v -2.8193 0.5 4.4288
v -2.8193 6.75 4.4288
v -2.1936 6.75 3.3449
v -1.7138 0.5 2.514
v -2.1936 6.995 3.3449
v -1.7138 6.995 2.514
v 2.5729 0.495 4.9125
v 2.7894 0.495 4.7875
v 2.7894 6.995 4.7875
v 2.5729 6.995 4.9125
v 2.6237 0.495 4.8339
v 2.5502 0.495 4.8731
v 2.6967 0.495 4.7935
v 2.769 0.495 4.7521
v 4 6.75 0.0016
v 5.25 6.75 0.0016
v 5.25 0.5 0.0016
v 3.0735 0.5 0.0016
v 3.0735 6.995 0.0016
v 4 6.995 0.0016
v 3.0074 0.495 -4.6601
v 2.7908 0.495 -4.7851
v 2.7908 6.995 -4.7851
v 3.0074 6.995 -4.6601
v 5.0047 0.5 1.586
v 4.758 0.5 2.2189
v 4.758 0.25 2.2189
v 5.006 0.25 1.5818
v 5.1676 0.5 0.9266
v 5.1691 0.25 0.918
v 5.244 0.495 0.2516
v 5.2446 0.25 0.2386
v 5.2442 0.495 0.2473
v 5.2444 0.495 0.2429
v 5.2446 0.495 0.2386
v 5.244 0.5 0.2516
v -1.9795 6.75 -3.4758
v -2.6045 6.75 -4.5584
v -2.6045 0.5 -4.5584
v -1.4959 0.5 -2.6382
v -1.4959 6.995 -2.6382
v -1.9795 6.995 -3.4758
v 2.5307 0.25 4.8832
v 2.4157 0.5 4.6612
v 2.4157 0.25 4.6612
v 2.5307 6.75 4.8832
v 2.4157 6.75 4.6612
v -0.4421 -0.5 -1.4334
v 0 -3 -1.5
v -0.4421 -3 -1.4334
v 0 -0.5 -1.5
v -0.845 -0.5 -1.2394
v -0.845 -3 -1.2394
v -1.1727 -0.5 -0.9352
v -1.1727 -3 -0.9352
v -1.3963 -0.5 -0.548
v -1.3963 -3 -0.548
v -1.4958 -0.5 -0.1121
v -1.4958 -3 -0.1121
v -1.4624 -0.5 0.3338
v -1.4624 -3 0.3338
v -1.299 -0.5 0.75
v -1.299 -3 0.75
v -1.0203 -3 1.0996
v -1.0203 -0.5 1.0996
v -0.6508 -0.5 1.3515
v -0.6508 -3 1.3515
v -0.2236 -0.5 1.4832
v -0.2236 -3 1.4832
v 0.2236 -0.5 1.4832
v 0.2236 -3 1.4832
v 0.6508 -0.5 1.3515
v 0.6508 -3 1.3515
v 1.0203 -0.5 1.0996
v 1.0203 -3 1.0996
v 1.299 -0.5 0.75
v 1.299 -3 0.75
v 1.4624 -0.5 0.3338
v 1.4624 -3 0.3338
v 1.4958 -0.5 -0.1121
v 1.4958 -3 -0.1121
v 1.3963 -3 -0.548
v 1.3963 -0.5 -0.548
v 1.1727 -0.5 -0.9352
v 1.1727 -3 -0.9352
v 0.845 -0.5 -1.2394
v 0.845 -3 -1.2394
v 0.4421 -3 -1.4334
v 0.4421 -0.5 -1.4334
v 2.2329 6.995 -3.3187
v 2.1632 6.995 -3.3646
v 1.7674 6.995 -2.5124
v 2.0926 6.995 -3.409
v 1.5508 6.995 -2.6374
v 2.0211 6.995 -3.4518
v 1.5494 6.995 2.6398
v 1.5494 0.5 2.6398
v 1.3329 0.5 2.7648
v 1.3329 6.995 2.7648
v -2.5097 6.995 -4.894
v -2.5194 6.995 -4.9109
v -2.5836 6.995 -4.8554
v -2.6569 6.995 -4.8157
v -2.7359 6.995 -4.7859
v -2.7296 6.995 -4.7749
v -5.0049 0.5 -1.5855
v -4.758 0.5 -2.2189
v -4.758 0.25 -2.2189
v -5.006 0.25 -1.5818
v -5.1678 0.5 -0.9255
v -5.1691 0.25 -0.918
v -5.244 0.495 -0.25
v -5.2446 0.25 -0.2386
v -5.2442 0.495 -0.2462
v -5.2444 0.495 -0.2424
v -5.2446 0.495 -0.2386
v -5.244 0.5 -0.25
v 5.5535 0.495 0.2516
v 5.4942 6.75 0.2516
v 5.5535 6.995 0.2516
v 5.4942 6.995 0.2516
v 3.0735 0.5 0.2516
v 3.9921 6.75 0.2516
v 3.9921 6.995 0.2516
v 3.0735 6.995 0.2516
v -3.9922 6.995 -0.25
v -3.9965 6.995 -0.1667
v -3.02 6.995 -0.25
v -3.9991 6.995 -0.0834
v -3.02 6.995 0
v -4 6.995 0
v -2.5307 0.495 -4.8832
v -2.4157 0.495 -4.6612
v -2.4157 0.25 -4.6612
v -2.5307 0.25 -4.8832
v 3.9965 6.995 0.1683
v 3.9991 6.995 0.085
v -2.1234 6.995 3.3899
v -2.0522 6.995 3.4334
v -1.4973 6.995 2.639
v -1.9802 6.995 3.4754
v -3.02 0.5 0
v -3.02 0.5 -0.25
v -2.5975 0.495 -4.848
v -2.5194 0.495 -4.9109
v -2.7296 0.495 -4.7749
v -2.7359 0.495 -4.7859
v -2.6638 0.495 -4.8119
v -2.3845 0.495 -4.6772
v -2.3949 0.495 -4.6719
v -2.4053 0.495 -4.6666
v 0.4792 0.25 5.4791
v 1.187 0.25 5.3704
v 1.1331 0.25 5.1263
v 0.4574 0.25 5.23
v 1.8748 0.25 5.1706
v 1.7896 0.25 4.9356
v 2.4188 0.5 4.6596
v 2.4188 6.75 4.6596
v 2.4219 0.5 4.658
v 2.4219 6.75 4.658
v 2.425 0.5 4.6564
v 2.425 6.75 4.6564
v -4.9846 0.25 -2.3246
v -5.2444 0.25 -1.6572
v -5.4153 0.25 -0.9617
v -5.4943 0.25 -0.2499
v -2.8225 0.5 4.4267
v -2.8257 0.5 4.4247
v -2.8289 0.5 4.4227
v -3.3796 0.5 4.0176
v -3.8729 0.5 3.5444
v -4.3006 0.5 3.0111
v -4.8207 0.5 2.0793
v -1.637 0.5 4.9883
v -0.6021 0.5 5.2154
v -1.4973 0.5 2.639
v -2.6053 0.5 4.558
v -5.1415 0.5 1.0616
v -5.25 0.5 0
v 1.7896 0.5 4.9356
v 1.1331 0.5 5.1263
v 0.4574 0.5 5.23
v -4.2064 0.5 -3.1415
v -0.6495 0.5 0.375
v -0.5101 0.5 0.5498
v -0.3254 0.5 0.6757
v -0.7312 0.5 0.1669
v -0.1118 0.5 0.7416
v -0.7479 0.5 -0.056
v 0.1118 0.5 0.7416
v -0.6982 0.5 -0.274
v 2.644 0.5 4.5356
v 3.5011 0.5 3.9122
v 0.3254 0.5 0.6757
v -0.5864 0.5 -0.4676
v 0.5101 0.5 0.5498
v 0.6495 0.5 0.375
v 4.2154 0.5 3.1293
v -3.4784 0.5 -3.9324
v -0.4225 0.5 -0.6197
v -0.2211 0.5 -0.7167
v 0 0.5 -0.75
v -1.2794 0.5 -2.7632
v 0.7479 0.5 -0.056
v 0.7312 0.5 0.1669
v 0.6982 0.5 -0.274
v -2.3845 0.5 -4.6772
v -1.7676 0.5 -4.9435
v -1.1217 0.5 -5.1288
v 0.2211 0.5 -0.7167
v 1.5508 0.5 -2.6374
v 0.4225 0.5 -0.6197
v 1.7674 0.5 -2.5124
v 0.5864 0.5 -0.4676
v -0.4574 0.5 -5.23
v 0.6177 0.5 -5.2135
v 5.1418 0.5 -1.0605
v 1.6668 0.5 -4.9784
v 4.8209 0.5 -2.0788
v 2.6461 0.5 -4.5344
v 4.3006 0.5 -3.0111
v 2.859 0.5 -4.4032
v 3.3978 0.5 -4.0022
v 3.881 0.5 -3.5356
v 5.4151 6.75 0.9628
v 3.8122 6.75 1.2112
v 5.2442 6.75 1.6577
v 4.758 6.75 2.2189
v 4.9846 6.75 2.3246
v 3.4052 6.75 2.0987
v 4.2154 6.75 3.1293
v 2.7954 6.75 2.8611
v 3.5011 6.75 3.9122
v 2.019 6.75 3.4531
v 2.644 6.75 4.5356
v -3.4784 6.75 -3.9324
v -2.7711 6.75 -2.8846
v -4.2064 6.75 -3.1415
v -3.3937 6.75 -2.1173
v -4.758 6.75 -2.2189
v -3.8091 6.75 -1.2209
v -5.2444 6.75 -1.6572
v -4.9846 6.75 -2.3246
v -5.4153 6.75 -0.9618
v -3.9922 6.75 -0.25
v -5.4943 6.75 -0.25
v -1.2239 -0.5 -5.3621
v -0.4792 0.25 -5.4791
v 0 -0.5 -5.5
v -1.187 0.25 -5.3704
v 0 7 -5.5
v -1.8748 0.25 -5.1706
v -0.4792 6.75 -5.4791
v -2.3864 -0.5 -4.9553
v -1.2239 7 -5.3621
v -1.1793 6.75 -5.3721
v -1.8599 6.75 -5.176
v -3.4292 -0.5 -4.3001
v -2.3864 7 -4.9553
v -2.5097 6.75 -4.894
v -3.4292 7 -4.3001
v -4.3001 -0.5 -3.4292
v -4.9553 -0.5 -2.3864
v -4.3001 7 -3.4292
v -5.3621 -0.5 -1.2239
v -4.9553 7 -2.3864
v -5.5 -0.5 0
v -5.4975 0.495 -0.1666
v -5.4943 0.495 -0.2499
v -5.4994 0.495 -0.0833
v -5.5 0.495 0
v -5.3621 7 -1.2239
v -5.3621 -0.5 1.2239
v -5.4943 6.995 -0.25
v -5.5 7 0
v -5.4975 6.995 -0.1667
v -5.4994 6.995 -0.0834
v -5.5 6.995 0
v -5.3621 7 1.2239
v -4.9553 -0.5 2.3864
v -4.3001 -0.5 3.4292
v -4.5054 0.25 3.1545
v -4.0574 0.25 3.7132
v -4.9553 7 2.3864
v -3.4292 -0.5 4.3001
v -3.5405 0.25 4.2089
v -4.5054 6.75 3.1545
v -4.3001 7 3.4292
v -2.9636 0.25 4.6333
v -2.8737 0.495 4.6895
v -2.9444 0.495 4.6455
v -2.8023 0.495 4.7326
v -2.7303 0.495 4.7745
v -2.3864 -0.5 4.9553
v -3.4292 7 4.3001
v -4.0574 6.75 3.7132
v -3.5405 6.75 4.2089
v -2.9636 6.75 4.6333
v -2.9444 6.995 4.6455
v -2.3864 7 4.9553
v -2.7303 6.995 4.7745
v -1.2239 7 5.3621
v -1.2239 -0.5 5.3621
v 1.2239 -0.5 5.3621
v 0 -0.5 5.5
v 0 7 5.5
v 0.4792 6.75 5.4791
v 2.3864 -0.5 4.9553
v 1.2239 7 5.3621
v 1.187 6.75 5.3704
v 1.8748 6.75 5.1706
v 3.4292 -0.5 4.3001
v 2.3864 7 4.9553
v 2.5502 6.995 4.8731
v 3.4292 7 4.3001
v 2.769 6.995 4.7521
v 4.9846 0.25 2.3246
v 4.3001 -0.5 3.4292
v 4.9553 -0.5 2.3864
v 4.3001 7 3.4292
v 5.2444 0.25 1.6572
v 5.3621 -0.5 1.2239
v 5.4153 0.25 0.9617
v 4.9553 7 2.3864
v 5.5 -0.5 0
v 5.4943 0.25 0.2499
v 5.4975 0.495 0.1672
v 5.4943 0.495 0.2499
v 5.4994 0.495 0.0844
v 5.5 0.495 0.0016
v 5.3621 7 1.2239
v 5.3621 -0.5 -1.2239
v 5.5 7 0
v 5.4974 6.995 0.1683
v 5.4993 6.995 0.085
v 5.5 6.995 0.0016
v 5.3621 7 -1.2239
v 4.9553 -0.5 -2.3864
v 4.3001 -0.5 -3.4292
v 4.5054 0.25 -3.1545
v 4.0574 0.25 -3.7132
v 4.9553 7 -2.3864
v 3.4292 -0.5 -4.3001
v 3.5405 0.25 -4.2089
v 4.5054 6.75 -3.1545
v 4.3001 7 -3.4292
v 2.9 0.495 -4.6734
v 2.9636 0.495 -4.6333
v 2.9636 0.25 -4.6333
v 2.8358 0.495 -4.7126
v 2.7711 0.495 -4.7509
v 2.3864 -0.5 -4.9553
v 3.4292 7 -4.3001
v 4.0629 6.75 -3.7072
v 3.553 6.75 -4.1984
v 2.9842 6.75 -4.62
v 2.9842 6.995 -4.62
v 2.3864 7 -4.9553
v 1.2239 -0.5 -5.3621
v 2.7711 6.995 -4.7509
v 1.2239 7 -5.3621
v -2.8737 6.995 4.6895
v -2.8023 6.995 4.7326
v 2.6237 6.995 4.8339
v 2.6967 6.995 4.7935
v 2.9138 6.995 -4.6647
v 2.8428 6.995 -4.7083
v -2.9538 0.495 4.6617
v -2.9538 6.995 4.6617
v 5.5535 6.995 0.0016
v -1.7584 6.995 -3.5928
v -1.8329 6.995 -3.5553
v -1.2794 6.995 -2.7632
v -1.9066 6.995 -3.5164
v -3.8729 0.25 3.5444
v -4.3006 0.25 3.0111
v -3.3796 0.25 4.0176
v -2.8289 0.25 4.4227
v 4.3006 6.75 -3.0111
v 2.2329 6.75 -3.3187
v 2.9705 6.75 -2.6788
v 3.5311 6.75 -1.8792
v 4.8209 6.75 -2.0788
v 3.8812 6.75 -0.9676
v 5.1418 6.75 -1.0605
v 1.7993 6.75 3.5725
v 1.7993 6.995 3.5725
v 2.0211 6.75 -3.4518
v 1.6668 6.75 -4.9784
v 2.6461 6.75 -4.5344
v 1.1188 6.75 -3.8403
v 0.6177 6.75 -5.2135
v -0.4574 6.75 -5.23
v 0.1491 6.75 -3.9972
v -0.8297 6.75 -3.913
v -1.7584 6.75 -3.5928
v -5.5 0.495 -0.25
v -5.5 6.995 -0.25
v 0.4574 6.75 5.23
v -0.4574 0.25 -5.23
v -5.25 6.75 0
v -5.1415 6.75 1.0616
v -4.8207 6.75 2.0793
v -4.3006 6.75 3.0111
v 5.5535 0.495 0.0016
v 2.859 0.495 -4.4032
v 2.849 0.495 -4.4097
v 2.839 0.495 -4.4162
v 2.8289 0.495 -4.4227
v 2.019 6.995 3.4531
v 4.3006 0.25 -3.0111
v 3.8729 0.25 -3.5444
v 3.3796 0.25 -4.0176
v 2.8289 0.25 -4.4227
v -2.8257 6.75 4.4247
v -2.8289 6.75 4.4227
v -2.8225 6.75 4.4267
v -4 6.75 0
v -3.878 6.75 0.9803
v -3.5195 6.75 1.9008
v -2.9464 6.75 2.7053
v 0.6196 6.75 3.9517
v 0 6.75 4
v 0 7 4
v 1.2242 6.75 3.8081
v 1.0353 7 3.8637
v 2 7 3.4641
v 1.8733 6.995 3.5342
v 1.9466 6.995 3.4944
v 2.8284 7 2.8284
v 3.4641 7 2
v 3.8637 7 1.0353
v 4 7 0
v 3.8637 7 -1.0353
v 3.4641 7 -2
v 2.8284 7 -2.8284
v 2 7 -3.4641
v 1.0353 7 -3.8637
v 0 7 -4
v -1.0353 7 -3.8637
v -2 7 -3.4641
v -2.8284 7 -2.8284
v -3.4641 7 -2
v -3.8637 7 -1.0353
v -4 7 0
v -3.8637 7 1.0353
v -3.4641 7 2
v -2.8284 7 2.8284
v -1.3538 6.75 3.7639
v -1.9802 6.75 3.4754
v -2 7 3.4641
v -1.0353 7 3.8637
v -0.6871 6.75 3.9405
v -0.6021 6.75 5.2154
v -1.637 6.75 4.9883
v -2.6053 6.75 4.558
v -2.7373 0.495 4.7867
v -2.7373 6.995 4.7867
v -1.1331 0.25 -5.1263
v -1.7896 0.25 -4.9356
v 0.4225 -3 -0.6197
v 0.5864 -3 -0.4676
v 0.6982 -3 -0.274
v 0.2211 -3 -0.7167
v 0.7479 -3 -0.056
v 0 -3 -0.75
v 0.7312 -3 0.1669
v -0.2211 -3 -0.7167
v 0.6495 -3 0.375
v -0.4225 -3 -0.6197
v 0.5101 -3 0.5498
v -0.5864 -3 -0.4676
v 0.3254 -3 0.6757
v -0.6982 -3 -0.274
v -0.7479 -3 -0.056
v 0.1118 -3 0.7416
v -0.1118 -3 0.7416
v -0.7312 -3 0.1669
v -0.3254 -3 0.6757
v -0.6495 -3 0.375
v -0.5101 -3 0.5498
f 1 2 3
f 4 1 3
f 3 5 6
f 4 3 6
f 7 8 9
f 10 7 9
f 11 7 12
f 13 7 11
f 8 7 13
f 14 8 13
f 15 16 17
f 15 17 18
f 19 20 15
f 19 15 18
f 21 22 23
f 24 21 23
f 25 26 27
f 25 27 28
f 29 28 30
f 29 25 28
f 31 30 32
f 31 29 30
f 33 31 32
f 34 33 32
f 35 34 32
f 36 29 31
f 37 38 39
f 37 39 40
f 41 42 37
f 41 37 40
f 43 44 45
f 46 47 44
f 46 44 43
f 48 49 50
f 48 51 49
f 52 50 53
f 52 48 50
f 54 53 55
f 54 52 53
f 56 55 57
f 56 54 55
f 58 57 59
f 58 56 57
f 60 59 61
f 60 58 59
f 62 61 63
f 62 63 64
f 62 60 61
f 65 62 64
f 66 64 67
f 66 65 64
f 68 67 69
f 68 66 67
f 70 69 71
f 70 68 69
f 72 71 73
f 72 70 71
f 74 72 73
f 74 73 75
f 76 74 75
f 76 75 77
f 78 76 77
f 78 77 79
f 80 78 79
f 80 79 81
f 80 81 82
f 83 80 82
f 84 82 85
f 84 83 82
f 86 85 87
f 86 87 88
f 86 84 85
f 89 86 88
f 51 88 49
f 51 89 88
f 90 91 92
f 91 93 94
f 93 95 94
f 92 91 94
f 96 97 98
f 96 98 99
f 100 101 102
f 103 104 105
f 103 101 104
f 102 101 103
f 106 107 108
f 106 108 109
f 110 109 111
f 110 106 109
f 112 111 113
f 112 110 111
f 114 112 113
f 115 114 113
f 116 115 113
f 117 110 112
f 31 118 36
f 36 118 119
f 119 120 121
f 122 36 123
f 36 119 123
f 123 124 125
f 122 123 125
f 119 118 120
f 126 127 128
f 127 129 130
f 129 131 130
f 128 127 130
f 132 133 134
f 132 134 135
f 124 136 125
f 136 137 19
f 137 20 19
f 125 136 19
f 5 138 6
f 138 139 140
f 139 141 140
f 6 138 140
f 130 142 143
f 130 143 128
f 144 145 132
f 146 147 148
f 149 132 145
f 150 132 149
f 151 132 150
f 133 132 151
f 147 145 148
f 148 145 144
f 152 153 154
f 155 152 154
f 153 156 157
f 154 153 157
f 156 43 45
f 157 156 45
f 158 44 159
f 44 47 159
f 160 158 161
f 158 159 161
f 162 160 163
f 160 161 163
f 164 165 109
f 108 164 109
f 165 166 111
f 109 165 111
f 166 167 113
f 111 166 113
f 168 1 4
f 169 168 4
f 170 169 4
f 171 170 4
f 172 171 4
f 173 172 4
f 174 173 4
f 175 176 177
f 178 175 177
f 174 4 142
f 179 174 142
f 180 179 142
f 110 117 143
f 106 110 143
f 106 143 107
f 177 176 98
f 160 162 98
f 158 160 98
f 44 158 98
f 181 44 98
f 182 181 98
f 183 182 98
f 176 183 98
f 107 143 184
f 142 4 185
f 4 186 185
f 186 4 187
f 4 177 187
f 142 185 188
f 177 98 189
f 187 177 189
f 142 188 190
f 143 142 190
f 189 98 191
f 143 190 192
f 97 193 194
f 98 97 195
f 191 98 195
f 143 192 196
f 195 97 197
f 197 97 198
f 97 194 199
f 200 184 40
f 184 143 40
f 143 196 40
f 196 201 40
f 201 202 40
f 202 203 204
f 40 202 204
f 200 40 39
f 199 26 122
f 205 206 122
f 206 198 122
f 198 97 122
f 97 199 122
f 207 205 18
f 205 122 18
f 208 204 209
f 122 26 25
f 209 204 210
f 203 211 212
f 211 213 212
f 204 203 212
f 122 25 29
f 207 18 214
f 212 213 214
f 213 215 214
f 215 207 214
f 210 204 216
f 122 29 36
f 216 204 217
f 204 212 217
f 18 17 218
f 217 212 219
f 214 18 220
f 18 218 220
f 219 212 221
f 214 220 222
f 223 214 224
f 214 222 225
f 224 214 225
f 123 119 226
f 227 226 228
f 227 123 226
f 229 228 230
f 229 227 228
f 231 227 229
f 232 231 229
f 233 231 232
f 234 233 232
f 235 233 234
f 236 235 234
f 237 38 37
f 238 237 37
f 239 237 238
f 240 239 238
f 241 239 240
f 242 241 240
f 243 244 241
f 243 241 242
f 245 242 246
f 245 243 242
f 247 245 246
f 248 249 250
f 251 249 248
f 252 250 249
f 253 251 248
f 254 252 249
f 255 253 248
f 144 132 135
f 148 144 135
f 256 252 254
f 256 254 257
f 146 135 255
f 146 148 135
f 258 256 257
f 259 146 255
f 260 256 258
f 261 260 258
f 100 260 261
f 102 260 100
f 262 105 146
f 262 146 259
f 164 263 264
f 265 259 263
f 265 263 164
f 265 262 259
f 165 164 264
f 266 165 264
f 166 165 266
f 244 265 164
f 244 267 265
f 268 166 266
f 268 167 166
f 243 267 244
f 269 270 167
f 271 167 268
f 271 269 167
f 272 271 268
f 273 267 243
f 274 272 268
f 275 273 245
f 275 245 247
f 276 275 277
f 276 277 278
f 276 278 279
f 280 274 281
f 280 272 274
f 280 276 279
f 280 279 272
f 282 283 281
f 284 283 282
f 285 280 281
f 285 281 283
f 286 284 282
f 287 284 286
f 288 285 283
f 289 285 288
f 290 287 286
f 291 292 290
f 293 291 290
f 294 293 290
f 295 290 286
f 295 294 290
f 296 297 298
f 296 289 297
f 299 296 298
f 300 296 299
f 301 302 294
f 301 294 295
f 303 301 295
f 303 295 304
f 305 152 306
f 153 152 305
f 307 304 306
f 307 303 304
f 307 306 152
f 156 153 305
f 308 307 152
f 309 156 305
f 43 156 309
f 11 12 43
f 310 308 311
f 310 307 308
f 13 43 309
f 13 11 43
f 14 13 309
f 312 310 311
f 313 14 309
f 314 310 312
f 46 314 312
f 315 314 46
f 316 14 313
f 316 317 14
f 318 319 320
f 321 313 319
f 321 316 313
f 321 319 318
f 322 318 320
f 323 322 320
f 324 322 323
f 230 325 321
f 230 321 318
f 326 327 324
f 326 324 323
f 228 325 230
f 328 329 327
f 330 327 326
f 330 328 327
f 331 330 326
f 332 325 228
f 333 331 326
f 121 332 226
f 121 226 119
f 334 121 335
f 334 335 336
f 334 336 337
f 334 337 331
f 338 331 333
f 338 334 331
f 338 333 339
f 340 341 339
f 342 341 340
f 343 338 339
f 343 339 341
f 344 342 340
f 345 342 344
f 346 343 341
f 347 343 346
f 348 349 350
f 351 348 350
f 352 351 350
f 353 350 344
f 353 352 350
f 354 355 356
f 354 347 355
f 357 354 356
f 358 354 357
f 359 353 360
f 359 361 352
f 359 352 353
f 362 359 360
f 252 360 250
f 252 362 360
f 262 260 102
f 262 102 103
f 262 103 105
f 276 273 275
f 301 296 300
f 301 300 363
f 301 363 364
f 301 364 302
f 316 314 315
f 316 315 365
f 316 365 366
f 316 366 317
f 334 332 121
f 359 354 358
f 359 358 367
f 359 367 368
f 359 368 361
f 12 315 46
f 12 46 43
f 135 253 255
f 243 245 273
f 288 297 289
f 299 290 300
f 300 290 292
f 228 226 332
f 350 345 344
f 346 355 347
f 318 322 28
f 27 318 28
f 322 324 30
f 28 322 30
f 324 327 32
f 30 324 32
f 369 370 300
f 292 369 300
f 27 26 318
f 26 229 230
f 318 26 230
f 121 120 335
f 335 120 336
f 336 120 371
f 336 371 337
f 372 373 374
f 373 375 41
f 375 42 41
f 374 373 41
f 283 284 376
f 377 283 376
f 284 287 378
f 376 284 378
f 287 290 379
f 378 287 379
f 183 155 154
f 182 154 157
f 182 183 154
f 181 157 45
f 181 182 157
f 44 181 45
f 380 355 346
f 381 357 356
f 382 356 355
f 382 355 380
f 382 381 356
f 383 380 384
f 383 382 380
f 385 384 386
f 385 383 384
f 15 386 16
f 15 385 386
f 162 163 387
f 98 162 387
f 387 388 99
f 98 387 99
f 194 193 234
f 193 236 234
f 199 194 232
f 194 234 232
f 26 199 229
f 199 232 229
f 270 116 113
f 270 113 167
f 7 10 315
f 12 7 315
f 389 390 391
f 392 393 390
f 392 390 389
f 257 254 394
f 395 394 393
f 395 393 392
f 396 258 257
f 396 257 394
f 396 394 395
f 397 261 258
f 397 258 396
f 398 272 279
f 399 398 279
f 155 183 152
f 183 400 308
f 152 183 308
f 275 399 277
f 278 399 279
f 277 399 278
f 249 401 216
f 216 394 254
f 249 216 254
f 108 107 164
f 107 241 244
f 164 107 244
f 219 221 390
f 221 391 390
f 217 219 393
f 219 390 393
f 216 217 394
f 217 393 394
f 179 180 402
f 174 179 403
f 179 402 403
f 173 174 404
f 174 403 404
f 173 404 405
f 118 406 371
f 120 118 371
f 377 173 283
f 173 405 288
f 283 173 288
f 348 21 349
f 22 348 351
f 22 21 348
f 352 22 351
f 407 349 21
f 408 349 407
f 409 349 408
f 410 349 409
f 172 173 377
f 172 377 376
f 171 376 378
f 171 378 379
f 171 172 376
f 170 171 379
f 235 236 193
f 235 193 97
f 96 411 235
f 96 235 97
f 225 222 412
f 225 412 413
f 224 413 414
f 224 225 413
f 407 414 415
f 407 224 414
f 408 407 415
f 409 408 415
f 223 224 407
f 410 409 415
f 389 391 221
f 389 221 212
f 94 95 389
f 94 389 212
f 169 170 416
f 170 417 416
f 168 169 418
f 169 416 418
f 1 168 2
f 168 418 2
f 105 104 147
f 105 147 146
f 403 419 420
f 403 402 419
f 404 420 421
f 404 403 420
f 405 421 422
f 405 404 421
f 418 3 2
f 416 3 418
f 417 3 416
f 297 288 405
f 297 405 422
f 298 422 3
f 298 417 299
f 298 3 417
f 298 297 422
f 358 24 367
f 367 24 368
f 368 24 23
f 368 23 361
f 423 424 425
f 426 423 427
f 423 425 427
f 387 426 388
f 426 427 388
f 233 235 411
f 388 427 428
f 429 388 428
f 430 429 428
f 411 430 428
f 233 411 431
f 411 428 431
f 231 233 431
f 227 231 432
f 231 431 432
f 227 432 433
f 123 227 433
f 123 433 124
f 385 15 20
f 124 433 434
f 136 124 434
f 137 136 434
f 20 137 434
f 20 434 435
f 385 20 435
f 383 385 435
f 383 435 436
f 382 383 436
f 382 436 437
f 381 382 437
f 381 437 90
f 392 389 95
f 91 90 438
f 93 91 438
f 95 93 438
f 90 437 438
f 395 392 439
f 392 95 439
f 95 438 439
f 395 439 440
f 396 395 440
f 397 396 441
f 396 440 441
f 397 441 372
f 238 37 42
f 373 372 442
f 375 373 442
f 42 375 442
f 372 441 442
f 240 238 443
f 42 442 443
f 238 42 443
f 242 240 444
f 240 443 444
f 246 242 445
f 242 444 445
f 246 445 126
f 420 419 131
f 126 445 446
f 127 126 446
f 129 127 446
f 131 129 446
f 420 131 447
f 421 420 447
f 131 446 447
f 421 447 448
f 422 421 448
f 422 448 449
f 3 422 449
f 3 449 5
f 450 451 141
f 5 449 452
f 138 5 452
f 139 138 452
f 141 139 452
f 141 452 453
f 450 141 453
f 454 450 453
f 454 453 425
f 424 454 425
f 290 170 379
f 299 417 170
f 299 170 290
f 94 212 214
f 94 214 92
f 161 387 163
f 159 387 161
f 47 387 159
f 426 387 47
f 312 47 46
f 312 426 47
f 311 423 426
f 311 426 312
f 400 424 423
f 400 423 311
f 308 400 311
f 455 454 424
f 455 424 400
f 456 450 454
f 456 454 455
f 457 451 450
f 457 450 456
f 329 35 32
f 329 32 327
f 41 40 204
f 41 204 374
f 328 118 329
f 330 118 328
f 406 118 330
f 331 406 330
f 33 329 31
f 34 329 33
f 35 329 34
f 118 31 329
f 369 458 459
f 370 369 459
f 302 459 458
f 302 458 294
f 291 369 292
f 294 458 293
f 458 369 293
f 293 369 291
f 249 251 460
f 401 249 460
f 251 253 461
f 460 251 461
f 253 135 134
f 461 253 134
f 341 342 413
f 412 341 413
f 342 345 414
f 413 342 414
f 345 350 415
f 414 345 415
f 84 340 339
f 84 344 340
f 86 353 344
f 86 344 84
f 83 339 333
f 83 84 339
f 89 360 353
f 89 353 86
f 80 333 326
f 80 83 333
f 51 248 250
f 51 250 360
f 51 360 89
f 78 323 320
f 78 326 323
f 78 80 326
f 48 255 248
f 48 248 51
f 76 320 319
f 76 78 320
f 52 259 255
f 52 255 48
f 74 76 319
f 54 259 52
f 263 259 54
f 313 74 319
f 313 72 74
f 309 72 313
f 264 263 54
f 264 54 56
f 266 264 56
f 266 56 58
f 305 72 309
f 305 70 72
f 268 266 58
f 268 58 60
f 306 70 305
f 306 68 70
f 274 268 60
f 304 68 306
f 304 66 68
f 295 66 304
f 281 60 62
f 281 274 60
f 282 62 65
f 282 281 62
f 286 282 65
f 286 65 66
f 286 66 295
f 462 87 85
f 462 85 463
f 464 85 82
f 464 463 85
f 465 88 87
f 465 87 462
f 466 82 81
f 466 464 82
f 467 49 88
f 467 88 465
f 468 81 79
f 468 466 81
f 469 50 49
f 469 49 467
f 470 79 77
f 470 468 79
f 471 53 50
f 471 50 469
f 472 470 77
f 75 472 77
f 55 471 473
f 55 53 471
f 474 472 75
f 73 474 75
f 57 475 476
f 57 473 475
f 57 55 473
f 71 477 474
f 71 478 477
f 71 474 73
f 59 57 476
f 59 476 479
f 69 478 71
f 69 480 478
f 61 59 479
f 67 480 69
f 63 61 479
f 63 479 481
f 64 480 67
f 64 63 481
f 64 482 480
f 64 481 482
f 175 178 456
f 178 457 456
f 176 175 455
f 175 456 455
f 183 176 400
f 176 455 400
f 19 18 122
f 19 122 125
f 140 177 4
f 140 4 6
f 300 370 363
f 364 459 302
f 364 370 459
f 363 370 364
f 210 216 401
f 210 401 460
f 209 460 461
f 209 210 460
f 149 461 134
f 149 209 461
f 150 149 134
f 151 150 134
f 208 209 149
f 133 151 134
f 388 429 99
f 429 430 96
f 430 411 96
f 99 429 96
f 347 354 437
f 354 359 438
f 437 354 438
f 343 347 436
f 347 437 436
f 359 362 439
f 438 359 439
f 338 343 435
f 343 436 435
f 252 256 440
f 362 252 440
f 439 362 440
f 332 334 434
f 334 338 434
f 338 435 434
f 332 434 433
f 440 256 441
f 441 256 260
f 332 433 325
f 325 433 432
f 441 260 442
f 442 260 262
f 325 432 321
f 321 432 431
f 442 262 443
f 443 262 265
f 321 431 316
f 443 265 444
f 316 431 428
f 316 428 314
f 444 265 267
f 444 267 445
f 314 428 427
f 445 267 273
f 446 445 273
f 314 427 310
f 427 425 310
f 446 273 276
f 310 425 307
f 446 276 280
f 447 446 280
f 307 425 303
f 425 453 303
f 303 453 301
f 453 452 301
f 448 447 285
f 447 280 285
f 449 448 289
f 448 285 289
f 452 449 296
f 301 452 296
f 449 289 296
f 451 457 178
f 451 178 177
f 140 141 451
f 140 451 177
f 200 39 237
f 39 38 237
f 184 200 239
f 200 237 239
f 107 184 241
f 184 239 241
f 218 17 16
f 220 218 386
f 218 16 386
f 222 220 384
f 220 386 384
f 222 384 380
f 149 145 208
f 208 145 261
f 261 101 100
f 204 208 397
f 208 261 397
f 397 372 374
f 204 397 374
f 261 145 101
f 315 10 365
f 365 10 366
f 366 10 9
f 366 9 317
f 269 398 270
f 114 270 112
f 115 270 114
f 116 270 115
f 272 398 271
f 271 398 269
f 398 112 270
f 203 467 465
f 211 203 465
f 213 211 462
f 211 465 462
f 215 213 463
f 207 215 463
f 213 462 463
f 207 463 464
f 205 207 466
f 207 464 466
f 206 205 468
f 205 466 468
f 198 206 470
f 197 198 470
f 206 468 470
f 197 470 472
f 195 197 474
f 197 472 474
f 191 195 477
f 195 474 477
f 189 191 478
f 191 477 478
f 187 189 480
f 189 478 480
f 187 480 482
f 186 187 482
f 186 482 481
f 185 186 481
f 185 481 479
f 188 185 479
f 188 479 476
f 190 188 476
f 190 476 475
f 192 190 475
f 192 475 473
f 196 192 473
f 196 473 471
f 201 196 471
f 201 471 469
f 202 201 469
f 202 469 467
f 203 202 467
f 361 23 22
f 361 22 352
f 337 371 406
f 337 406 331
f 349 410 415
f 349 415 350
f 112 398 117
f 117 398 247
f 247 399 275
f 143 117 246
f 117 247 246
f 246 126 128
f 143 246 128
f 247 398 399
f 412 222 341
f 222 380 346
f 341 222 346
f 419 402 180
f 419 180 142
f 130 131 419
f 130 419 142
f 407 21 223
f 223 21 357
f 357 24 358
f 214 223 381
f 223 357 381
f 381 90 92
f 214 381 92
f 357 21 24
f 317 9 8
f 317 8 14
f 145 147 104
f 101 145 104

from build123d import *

# Parameters (mm, degrees)
SKETCH1_W                 = 5.5
SKETCH1_H                 = 7
SHELL1_T                  = -0.25
SHELL1_THICKNESS_2_FACE_R = 5.25
SHELL1_THICKNESS_2_DEPTH  = 0.25
SKETCH6_R                 = 5.5
SKETCH6_R_2               = 4
BOSS_EXTRUDE1_DEPTH       = 0.25
WRAP1_SECTION_W           = 0.25
WRAP1_SECTION_H           = 6.5
WRAP1_ANGLE               = 22.397441082
CIRPATTERN1_COUNT         = 6
SKETCH10_W                = 2.48
SKETCH10_H                = 6.5
BOSS_EXTRUDE2_DEPTH       = 0.25
CIRPATTERN2_COUNT         = 6
CUT_EXTRUDE1_REACH        = 14.692
SKETCH12_R                = 0.75


with BuildPart() as part:
    # Sketch1 → Revolve1 (revolve)
    with BuildSketch(Plane.XY, mode=Mode.PRIVATE) as revolve1_sk:
        with Locations((2.75, 3.5)):
            Rectangle(SKETCH1_W, SKETCH1_H)
    revolve(revolve1_sk.sketch.rotate(Axis((0, 0, 0), (0, 1, 0)), 90), axis=Axis((0, 0, 0), (0, 1, 0)))

    # Shell1
    shell1_openings = [part.faces().sort_by_distance(p)[0] for p in [
        (0, 7, 0),
    ]]
    offset(amount=SHELL1_T, openings=shell1_openings, kind=Kind.INTERSECTION)

    # Shell1 thickness 2 face (on inner face of the shell) → Shell1 thickness 2 (add)
    with BuildSketch(Plane(origin=(0, 0.25, 0), x_dir=(0, 0, -1), z_dir=(0, -1, 0))):
        Circle(SHELL1_THICKNESS_2_FACE_R)
    extrude(amount=-SHELL1_THICKNESS_2_DEPTH)

    # Sketch6 → Boss-Extrude1 (add)
    with BuildSketch(Plane(origin=(0, 7, 0), x_dir=(1, 0, 0), z_dir=(0, 1, 0))):
        with Locations(Location((0, 0, 0), (0, 0, 90))):
            Circle(SKETCH6_R)
        with Locations(Location((0, 0, 0), (0, 0, 270))):
            Circle(SKETCH6_R_2, mode=Mode.SUBTRACT)
    extrude(amount=-BOSS_EXTRUDE1_DEPTH)

    # Wrap1 section (on wrap section) → Wrap1 (revolve, cut)
    with BuildSketch(Plane(origin=(0, 0, 0), x_dir=(0.9062945487659477, 0, 0.42264665014303293), z_dir=(-0.42264665014303293, 0, 0.9062945487659477))):
        with Locations((5.375, 3.5)):
            Rectangle(WRAP1_SECTION_W, WRAP1_SECTION_H)
    wrap1 = revolve(axis=Axis((0, 0, 0), (0, 1, 0)), revolution_arc=WRAP1_ANGLE, mode=Mode.SUBTRACT)

    # CirPattern1: Wrap1 ×6 about axis
    cirpattern1_axis = Axis((0, 0, 0), (0, 1, 0))
    for i in range(1, CIRPATTERN1_COUNT):
        add(wrap1.rotate(cirpattern1_axis, i * 360 / CIRPATTERN1_COUNT), mode=Mode.SUBTRACT)

    # Sketch10 → Boss-Extrude2 (add)
    with BuildSketch(Plane.XY):
        with Locations((-4.26, 3.745038645)):
            Rectangle(SKETCH10_W, SKETCH10_H)
    boss_extrude2 = extrude(amount=-BOSS_EXTRUDE2_DEPTH)

    # CirPattern2: Boss-Extrude2 ×6 about axis
    cirpattern2_axis = Axis((0.026764782, 0, 0.000808926), (0, 1, 0))
    for i in range(1, CIRPATTERN2_COUNT):
        add(boss_extrude2.rotate(cirpattern2_axis, i * 360 / CIRPATTERN2_COUNT))

    # Sketch11 → Revolve3 (revolve)
    with BuildSketch(Plane.XY, mode=Mode.PRIVATE) as revolve3_sk:
        Polygon((-5.5, 0), (0, 0), (0, -3), (-1.5, -3), (-1.5, -0.5), (-5.5, -0.5), align=None)
    revolve(revolve3_sk.sketch.rotate(Axis((0, -3, 0), (0, 1, 0)), 270), axis=Axis((0, -3, 0), (0, 1, 0)))

    # Sketch12 → Cut-Extrude1 (cut, up to next)
    with BuildSketch(Plane.XZ.offset(3), mode=Mode.PRIVATE) as cut_extrude1_sk1:
        with Locations(Location((0, 0, 0), (0, 0, 270))):
            Circle(SKETCH12_R)
    cut_extrude1_tool1 = extrude(cut_extrude1_sk1.sketch, amount=-CUT_EXTRUDE1_REACH, mode=Mode.PRIVATE) & part.part
    add(cut_extrude1_tool1.solids().sort_by_distance((0, -3, 0))[0], mode=Mode.SUBTRACT)


solid = part.part
